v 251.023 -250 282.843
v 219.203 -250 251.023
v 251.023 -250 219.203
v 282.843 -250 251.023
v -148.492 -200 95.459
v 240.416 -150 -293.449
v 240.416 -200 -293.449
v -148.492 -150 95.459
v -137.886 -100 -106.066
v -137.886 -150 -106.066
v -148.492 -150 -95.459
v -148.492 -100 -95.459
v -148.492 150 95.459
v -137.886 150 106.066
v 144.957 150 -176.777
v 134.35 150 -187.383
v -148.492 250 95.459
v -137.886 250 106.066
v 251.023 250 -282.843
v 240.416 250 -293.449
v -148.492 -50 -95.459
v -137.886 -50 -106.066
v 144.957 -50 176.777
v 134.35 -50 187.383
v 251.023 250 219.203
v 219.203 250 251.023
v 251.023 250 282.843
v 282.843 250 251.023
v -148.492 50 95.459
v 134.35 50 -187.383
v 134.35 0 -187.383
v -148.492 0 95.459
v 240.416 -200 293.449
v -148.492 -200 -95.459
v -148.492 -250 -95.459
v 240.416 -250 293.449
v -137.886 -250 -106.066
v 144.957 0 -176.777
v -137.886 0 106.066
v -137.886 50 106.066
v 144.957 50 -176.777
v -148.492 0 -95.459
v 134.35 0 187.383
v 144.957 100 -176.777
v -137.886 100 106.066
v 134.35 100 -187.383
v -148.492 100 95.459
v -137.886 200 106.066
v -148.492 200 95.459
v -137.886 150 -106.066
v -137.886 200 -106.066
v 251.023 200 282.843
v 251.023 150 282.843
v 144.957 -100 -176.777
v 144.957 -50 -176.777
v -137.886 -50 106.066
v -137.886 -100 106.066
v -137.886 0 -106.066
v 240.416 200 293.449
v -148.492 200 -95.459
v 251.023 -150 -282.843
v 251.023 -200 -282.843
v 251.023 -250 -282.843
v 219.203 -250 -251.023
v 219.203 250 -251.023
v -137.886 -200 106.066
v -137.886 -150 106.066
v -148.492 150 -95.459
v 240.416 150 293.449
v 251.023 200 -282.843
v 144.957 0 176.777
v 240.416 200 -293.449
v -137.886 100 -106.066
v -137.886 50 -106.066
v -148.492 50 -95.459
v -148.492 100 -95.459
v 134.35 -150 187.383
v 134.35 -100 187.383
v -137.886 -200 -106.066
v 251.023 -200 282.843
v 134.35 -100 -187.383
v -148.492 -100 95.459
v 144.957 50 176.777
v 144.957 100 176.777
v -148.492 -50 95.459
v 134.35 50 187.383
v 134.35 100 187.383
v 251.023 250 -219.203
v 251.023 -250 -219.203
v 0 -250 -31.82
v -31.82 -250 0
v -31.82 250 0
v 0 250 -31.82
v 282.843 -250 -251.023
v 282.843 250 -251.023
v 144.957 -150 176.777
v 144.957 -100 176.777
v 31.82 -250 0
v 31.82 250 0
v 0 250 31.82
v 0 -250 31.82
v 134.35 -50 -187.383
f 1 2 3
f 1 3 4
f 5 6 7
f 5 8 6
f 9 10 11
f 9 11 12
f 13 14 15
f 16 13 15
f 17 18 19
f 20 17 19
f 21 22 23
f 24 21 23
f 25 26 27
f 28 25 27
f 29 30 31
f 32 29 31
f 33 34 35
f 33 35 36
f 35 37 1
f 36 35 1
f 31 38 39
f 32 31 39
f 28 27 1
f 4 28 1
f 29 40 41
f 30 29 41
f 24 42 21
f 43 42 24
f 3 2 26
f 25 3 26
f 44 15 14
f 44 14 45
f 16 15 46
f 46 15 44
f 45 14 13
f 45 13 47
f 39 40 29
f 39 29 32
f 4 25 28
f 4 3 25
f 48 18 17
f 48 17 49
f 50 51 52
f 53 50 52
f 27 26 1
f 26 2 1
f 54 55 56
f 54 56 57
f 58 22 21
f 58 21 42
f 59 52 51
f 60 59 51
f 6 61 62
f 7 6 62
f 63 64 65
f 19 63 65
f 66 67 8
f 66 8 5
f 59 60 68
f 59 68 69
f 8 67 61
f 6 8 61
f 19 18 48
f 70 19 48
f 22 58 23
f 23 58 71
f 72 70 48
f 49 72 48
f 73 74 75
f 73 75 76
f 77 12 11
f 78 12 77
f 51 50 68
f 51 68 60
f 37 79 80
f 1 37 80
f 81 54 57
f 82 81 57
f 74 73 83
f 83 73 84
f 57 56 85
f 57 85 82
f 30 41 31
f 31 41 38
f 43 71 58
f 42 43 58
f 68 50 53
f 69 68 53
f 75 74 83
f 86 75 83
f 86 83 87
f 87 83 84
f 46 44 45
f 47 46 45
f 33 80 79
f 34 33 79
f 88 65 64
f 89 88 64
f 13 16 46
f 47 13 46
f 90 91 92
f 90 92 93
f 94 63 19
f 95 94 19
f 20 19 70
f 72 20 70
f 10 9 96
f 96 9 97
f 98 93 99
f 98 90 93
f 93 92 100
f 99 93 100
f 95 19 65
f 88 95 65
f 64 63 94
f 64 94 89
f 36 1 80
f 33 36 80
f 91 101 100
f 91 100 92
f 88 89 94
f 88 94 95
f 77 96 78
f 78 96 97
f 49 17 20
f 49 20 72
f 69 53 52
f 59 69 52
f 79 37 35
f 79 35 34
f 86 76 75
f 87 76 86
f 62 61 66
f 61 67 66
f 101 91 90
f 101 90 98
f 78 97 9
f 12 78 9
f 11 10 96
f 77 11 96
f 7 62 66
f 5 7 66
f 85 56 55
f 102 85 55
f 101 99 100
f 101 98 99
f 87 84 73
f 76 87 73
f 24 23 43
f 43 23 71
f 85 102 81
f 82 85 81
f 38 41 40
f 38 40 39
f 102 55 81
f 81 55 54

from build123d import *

# Parameters (mm, degrees)
F1_DEPTH = 250
F2_W     = 205
F2_H     = 50
F2_W_2   = 150
F2_W_3   = 45
F3_DEPTH = 15
F4_W     = 50
F4_H     = 150
F4_H_2   = 205
F4_H_3   = 45
F5_DEPTH = 15
F6_W     = 450
F6_H     = 45
F6_W_2   = 50
F7_DEPTH = 45
F8_W     = 45
F8_H     = 450
F8_H_2   = 50
F9_DEPTH = 45


with BuildPart() as f1:
    # F0 (on Front) → F1 (new body, symmetric)
    with BuildSketch(Plane.XZ):
        Polygon((31.8198051534, 0), (0, 31.8198051534), (-31.8198051534, 0), (0, -31.8198051534), align=None)
    extrude(amount=F1_DEPTH, both=True)


with BuildPart() as f3:
    # F2 (on face) → F3 (new body)
    with BuildSketch(Plane(origin=(-15.9099025767, 0, 15.9099025767), x_dir=(0.7071067812, 0, 0.7071067812), z_dir=(-0.7071067812, 0, 0.7071067812))):
        with Locations((125, -225)):
            Rectangle(F2_W, F2_H)
        with Locations((302.5, -225)):
            Rectangle(F2_W_2, F2_H)
        with Locations((-97.5, -225)):
            Rectangle(F2_W_2, F2_H)
        with Locations((0, -225)):
            Rectangle(F2_W_3, F2_H)
    extrude(amount=F3_DEPTH)


with BuildPart() as f3b:
    # F2 (on face) → F3, piece 2 (new body)
    with BuildSketch(Plane(origin=(-15.9099025767, 0, 15.9099025767), x_dir=(0.7071067812, 0, 0.7071067812), z_dir=(-0.7071067812, 0, 0.7071067812))):
        with Locations((0, -125)):
            Rectangle(F2_W_3, F2_H)
        with Locations((125, -125)):
            Rectangle(F2_W, F2_H)
        with Locations((-97.5, -125)):
            Rectangle(F2_W_2, F2_H)
    extrude(amount=F3_DEPTH)


with BuildPart() as f3c:
    # F2 (on face) → F3, piece 3 (new body)
    with BuildSketch(Plane(origin=(-15.9099025767, 0, 15.9099025767), x_dir=(0.7071067812, 0, 0.7071067812), z_dir=(-0.7071067812, 0, 0.7071067812))):
        with Locations((0, -25)):
            Rectangle(F2_W_3, F2_H)
        with Locations((125, -25)):
            Rectangle(F2_W, F2_H)
        with Locations((-97.5, -25)):
            Rectangle(F2_W_2, F2_H)
    extrude(amount=F3_DEPTH)


with BuildPart() as f3d:
    # F2 (on face) → F3, piece 4 (new body)
    with BuildSketch(Plane(origin=(-15.9099025767, 0, 15.9099025767), x_dir=(0.7071067812, 0, 0.7071067812), z_dir=(-0.7071067812, 0, 0.7071067812))):
        with Locations((0, 75)):
            Rectangle(F2_W_3, F2_H)
        with Locations((125, 75)):
            Rectangle(F2_W, F2_H)
        with Locations((-97.5, 75)):
            Rectangle(F2_W_2, F2_H)
    extrude(amount=F3_DEPTH)


with BuildPart() as f3e:
    # F2 (on face) → F3, piece 5 (new body)
    with BuildSketch(Plane(origin=(-15.9099025767, 0, 15.9099025767), x_dir=(0.7071067812, 0, 0.7071067812), z_dir=(-0.7071067812, 0, 0.7071067812))):
        with Locations((0, 175)):
            Rectangle(F2_W_3, F2_H)
        with Locations((125, 175)):
            Rectangle(F2_W, F2_H)
        with Locations((-97.5, 175)):
            Rectangle(F2_W_2, F2_H)
        with Locations((302.5, 175)):
            Rectangle(F2_W_2, F2_H)
    extrude(amount=F3_DEPTH)


with BuildPart() as f5:
    # F4 (on face) → F5 (new body)
    with BuildSketch(Plane(origin=(-15.9099025767, 0, -15.9099025767), x_dir=(0, -1, 0), z_dir=(-0.7071067812, 0, -0.7071067812))):
        with Locations((175, -302.5)):
            Rectangle(F4_W, F4_H)
        with Locations((175, -125)):
            Rectangle(F4_W, F4_H_2)
        with Locations((175, 0)):
            Rectangle(F4_W, F4_H_3)
        with Locations((175, 97.5)):
            Rectangle(F4_W, F4_H)
    extrude(amount=F5_DEPTH)


with BuildPart() as f5b:
    # F4 (on face) → F5, piece 2 (new body)
    with BuildSketch(Plane(origin=(-15.9099025767, 0, -15.9099025767), x_dir=(0, -1, 0), z_dir=(-0.7071067812, 0, -0.7071067812))):
        with Locations((75, 97.5)):
            Rectangle(F4_W, F4_H)
        with Locations((75, 0)):
            Rectangle(F4_W, F4_H_3)
        with Locations((75, -125)):
            Rectangle(F4_W, F4_H_2)
    extrude(amount=F5_DEPTH)


with BuildPart() as f5c:
    # F4 (on face) → F5, piece 3 (new body)
    with BuildSketch(Plane(origin=(-15.9099025767, 0, -15.9099025767), x_dir=(0, -1, 0), z_dir=(-0.7071067812, 0, -0.7071067812))):
        with Locations((-25, -125)):
            Rectangle(F4_W, F4_H_2)
        with Locations((-25, 0)):
            Rectangle(F4_W, F4_H_3)
        with Locations((-25, 97.5)):
            Rectangle(F4_W, F4_H)
    extrude(amount=F5_DEPTH)


with BuildPart() as f5d:
    # F4 (on face) → F5, piece 4 (new body)
    with BuildSketch(Plane(origin=(-15.9099025767, 0, -15.9099025767), x_dir=(0, -1, 0), z_dir=(-0.7071067812, 0, -0.7071067812))):
        with Locations((-125, -125)):
            Rectangle(F4_W, F4_H_2)
        with Locations((-125, 0)):
            Rectangle(F4_W, F4_H_3)
        with Locations((-125, 97.5)):
            Rectangle(F4_W, F4_H)
    extrude(amount=F5_DEPTH)


with BuildPart() as f5e:
    # F4 (on face) → F5, piece 5 (new body)
    with BuildSketch(Plane(origin=(-15.9099025767, 0, -15.9099025767), x_dir=(0, -1, 0), z_dir=(-0.7071067812, 0, -0.7071067812))):
        with Locations((-225, 97.5)):
            Rectangle(F4_W, F4_H)
        with Locations((-225, 0)):
            Rectangle(F4_W, F4_H_3)
        with Locations((-225, -125)):
            Rectangle(F4_W, F4_H_2)
        with Locations((-225, -302.5)):
            Rectangle(F4_W, F4_H)
    extrude(amount=F5_DEPTH)


with BuildPart() as f7:
    # F6 (on face) → F7 (new body)
    with BuildSketch(Plane(origin=(-15.9099025767, 0, -15.9099025767), x_dir=(0, 1, 0), z_dir=(0.7071067812, 0, 0.7071067812))):
        with Locations((-25, -355)):
            Rectangle(F6_W, F6_H)
        with Locations((225, -355)):
            Rectangle(F6_W_2, F6_H)
    extrude(amount=F7_DEPTH)


with BuildPart() as f9:
    # F8 (on face) → F9 (new body)
    with BuildSketch(Plane(origin=(-15.9099025767, 0, 15.9099025767), x_dir=(0.7071067812, 0, 0.7071067812), z_dir=(0.7071067812, 0, -0.7071067812))):
        with Locations((355, -25)):
            Rectangle(F8_W, F8_H)
        with Locations((355, 225)):
            Rectangle(F8_W, F8_H_2)
    extrude(amount=F9_DEPTH)


solid = Compound([f1.part, f3.part, f3b.part, f3c.part, f3d.part, f3e.part, f5.part, f5b.part, f5c.part, f5d.part, f5e.part, f7.part, f9.part])
